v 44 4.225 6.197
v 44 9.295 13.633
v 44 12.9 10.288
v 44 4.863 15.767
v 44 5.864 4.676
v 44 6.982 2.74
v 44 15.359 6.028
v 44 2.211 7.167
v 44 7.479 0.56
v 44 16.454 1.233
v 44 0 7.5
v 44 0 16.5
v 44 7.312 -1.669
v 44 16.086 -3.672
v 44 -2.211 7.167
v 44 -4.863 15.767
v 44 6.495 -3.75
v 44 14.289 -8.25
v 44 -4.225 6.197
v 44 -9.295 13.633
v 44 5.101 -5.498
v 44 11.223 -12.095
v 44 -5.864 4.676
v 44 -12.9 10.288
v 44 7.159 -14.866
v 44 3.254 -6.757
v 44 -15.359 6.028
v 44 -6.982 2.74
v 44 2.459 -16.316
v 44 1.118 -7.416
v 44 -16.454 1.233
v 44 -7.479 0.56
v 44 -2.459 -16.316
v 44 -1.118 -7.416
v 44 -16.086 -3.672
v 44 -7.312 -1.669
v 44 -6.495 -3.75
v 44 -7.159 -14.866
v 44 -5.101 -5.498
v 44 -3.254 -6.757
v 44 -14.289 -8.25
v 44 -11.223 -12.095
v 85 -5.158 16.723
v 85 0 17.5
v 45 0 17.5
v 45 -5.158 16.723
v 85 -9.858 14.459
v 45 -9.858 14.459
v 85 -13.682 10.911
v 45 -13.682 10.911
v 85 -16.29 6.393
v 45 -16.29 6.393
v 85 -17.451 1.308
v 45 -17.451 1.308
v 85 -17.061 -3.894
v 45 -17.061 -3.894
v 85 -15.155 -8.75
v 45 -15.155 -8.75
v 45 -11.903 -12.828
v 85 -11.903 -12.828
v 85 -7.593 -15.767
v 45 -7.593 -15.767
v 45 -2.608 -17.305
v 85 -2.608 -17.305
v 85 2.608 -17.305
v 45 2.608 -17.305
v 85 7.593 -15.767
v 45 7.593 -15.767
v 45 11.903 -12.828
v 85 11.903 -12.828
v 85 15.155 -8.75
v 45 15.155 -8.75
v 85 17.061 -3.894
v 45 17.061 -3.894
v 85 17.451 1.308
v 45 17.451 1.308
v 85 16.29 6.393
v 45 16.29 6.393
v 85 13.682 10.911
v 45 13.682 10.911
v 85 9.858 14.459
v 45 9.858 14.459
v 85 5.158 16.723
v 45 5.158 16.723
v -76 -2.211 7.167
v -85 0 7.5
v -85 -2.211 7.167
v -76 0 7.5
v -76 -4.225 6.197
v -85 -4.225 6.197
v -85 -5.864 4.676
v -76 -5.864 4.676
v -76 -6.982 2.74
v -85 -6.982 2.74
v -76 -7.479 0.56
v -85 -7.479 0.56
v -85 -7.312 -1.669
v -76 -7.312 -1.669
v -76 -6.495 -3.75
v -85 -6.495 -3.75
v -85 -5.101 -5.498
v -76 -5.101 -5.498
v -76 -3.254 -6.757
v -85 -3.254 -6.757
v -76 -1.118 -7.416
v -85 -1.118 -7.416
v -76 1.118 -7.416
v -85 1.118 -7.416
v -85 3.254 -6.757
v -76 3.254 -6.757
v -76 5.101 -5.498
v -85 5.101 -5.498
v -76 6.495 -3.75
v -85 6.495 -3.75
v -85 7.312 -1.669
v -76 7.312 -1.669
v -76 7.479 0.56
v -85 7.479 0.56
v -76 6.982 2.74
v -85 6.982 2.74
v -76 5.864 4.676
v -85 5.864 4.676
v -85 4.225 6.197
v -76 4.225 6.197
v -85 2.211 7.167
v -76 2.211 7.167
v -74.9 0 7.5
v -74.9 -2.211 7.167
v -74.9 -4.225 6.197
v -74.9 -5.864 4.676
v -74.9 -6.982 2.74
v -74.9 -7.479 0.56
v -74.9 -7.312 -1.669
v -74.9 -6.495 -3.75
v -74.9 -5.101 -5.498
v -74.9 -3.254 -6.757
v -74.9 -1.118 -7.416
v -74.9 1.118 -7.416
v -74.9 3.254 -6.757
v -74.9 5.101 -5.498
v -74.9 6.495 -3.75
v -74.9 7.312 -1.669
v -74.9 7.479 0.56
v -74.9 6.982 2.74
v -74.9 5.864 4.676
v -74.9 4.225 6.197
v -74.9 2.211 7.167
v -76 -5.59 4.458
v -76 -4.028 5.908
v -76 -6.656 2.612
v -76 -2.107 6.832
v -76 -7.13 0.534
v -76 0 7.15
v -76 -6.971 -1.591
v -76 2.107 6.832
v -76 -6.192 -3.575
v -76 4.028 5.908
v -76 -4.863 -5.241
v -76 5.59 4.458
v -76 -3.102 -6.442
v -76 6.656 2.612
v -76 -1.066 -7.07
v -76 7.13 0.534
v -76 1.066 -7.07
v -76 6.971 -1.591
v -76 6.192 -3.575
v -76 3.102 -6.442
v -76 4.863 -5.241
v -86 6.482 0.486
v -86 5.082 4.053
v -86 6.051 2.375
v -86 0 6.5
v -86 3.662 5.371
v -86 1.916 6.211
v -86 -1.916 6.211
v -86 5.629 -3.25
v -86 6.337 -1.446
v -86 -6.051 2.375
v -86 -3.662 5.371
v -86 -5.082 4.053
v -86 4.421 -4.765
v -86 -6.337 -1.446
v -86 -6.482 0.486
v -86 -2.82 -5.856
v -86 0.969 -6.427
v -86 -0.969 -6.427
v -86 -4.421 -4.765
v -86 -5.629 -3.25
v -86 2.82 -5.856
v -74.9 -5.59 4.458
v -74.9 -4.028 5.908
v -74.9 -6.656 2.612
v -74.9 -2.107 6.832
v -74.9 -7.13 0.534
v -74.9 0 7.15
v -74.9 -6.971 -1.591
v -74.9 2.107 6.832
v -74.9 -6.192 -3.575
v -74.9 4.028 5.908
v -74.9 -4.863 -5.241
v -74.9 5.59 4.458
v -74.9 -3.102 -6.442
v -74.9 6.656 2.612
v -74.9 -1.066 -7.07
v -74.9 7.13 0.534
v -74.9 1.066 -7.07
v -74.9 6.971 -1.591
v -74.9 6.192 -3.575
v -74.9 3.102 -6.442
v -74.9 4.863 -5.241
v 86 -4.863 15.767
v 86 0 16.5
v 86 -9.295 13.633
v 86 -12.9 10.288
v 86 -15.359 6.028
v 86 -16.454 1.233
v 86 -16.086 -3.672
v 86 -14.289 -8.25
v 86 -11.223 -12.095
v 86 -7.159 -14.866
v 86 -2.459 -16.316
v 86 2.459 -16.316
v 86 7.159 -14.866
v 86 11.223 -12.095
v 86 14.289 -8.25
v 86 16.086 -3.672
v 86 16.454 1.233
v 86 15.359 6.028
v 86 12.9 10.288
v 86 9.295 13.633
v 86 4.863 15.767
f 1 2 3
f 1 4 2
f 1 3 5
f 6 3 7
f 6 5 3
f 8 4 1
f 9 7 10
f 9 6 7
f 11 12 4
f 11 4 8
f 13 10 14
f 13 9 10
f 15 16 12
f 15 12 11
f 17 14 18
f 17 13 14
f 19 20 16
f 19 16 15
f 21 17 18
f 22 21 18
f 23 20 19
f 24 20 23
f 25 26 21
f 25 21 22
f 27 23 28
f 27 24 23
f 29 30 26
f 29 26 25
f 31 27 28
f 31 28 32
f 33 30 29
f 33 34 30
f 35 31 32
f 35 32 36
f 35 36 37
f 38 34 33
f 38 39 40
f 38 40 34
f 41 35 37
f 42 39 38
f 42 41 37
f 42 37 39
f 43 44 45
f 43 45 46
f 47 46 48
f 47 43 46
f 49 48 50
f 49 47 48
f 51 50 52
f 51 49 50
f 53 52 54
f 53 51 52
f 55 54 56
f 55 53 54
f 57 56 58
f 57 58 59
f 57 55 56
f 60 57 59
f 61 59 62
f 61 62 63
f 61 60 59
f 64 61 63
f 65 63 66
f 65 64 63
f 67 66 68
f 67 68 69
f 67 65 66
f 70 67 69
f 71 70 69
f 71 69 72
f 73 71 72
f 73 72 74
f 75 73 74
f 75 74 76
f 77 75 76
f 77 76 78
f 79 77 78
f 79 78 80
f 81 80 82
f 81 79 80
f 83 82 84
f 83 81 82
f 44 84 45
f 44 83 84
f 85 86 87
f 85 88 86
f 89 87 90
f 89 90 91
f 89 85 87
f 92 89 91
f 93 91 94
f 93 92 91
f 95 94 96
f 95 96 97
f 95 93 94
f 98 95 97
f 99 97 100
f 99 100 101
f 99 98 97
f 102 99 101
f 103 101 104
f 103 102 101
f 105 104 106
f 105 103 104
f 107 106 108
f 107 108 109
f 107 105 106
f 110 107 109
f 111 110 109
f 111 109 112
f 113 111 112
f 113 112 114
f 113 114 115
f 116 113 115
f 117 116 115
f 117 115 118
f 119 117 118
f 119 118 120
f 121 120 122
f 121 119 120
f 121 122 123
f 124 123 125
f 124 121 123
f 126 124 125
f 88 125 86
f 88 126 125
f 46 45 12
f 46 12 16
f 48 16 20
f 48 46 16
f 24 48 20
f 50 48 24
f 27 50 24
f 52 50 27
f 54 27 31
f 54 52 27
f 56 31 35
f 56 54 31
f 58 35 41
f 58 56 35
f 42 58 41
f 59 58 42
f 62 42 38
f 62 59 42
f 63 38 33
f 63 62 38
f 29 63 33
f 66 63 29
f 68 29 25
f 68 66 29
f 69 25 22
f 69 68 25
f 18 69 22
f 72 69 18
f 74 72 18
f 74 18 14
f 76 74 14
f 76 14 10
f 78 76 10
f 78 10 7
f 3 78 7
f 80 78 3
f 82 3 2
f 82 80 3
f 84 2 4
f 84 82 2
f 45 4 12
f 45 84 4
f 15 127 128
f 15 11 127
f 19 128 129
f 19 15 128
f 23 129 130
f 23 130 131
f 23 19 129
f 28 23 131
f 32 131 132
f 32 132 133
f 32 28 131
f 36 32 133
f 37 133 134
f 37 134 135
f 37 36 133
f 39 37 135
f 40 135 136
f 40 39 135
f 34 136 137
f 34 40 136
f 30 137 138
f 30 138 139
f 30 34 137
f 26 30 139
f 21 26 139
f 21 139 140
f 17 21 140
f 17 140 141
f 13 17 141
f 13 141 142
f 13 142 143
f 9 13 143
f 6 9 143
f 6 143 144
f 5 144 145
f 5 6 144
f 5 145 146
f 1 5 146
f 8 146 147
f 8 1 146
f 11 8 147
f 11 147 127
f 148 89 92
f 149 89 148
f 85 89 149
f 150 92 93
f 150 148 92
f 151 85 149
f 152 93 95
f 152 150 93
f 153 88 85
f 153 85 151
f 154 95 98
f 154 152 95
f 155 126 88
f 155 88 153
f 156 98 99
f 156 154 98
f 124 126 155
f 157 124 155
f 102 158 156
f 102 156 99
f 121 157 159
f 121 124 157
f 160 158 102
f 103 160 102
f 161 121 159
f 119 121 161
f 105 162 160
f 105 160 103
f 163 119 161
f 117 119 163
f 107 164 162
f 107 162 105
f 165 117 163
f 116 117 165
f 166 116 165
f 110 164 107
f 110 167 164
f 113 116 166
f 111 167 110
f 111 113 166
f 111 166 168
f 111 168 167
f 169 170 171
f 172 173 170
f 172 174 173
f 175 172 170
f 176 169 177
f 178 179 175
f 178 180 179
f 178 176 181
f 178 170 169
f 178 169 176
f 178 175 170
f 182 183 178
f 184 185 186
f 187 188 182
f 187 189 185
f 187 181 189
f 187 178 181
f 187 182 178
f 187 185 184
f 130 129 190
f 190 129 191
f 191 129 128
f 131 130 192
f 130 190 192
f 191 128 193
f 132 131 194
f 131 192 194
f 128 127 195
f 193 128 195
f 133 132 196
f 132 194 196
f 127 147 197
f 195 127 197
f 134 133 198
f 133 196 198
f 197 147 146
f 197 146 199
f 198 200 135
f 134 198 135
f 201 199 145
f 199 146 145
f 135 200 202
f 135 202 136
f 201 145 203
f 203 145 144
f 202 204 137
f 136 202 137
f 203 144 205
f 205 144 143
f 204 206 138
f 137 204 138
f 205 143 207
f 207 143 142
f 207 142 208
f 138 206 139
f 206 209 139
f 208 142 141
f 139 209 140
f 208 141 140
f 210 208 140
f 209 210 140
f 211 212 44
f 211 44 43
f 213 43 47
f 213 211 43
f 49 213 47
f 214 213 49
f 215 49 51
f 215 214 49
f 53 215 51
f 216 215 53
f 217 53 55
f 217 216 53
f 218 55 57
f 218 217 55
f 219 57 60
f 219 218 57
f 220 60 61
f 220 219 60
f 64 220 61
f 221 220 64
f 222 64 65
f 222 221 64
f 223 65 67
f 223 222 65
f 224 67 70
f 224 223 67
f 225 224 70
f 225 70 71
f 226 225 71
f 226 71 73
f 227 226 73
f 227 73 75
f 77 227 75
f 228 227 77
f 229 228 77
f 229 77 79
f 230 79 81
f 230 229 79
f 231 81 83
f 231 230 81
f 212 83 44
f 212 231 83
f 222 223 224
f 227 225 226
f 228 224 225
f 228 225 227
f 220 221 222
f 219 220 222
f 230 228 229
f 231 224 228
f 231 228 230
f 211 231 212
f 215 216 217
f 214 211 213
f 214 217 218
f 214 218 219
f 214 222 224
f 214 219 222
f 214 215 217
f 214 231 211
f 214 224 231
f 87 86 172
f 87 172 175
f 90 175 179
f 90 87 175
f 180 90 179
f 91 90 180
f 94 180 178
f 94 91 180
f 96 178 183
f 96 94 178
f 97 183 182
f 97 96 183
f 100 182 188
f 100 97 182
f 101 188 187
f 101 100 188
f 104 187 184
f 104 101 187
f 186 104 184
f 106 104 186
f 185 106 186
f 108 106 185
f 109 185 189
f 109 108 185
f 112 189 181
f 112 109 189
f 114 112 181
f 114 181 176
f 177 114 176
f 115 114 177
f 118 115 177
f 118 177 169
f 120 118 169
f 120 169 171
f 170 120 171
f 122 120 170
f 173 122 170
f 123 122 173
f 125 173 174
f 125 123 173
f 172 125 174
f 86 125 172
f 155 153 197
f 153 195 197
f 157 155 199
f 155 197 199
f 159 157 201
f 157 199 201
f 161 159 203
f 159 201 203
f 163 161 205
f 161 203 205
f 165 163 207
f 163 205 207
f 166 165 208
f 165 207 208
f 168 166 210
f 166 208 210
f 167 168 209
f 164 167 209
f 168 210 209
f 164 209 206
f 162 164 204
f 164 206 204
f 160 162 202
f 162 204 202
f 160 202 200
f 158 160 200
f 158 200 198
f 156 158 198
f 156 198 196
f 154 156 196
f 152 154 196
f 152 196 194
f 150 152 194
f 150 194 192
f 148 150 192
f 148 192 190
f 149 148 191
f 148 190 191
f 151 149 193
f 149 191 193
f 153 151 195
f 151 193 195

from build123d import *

# Parameters (mm, degrees)
CHANFREIN1_SIZE = 1
ESQUISSE2_W     = 1.1
ESQUISSE2_H     = 8.504088504


with BuildPart() as part:
    # Esquisse1 → Révolution1 (revolve)
    with BuildSketch(Plane.XY, mode=Mode.PRIVATE) as r_volution1_sk:
        Polygon((-86, 0), (-86, 7.5), (44, 7.5), (44, 17.5), (86, 17.5), (86, 0), align=None)
    revolve(r_volution1_sk.sketch.rotate(Axis((-86, 0, 0), (1, 0, 0)), 90), axis=Axis((-86, 0, 0), (1, 0, 0)))  # turned: the seam where the file's is

    # Chanfrein1
    chanfrein1_edges = [part.edges().sort_by_distance(p)[0] for p in [
        (86, 0, -17.5),
        (44, 0, -17.5),
        (-86, 0, -7.5),
    ]]
    chamfer(chanfrein1_edges, length=CHANFREIN1_SIZE)

    # Esquisse2 → Enlèvement de matière-Révolution1 (revolve, cut)
    with BuildSketch(Plane.XY, mode=Mode.PRIVATE) as enl_vement_de_mati_re_r_volution1_sk:
        with Locations((-75.45, 11.402044252)):
            Rectangle(ESQUISSE2_W, ESQUISSE2_H)
    revolve(enl_vement_de_mati_re_r_volution1_sk.sketch.rotate(Axis((0, 0, 0), (-1, 0, 0)), 270), axis=Axis((0, 0, 0), (-1, 0, 0)), mode=Mode.SUBTRACT)  # turned: the seam where the file's is


solid = part.part
